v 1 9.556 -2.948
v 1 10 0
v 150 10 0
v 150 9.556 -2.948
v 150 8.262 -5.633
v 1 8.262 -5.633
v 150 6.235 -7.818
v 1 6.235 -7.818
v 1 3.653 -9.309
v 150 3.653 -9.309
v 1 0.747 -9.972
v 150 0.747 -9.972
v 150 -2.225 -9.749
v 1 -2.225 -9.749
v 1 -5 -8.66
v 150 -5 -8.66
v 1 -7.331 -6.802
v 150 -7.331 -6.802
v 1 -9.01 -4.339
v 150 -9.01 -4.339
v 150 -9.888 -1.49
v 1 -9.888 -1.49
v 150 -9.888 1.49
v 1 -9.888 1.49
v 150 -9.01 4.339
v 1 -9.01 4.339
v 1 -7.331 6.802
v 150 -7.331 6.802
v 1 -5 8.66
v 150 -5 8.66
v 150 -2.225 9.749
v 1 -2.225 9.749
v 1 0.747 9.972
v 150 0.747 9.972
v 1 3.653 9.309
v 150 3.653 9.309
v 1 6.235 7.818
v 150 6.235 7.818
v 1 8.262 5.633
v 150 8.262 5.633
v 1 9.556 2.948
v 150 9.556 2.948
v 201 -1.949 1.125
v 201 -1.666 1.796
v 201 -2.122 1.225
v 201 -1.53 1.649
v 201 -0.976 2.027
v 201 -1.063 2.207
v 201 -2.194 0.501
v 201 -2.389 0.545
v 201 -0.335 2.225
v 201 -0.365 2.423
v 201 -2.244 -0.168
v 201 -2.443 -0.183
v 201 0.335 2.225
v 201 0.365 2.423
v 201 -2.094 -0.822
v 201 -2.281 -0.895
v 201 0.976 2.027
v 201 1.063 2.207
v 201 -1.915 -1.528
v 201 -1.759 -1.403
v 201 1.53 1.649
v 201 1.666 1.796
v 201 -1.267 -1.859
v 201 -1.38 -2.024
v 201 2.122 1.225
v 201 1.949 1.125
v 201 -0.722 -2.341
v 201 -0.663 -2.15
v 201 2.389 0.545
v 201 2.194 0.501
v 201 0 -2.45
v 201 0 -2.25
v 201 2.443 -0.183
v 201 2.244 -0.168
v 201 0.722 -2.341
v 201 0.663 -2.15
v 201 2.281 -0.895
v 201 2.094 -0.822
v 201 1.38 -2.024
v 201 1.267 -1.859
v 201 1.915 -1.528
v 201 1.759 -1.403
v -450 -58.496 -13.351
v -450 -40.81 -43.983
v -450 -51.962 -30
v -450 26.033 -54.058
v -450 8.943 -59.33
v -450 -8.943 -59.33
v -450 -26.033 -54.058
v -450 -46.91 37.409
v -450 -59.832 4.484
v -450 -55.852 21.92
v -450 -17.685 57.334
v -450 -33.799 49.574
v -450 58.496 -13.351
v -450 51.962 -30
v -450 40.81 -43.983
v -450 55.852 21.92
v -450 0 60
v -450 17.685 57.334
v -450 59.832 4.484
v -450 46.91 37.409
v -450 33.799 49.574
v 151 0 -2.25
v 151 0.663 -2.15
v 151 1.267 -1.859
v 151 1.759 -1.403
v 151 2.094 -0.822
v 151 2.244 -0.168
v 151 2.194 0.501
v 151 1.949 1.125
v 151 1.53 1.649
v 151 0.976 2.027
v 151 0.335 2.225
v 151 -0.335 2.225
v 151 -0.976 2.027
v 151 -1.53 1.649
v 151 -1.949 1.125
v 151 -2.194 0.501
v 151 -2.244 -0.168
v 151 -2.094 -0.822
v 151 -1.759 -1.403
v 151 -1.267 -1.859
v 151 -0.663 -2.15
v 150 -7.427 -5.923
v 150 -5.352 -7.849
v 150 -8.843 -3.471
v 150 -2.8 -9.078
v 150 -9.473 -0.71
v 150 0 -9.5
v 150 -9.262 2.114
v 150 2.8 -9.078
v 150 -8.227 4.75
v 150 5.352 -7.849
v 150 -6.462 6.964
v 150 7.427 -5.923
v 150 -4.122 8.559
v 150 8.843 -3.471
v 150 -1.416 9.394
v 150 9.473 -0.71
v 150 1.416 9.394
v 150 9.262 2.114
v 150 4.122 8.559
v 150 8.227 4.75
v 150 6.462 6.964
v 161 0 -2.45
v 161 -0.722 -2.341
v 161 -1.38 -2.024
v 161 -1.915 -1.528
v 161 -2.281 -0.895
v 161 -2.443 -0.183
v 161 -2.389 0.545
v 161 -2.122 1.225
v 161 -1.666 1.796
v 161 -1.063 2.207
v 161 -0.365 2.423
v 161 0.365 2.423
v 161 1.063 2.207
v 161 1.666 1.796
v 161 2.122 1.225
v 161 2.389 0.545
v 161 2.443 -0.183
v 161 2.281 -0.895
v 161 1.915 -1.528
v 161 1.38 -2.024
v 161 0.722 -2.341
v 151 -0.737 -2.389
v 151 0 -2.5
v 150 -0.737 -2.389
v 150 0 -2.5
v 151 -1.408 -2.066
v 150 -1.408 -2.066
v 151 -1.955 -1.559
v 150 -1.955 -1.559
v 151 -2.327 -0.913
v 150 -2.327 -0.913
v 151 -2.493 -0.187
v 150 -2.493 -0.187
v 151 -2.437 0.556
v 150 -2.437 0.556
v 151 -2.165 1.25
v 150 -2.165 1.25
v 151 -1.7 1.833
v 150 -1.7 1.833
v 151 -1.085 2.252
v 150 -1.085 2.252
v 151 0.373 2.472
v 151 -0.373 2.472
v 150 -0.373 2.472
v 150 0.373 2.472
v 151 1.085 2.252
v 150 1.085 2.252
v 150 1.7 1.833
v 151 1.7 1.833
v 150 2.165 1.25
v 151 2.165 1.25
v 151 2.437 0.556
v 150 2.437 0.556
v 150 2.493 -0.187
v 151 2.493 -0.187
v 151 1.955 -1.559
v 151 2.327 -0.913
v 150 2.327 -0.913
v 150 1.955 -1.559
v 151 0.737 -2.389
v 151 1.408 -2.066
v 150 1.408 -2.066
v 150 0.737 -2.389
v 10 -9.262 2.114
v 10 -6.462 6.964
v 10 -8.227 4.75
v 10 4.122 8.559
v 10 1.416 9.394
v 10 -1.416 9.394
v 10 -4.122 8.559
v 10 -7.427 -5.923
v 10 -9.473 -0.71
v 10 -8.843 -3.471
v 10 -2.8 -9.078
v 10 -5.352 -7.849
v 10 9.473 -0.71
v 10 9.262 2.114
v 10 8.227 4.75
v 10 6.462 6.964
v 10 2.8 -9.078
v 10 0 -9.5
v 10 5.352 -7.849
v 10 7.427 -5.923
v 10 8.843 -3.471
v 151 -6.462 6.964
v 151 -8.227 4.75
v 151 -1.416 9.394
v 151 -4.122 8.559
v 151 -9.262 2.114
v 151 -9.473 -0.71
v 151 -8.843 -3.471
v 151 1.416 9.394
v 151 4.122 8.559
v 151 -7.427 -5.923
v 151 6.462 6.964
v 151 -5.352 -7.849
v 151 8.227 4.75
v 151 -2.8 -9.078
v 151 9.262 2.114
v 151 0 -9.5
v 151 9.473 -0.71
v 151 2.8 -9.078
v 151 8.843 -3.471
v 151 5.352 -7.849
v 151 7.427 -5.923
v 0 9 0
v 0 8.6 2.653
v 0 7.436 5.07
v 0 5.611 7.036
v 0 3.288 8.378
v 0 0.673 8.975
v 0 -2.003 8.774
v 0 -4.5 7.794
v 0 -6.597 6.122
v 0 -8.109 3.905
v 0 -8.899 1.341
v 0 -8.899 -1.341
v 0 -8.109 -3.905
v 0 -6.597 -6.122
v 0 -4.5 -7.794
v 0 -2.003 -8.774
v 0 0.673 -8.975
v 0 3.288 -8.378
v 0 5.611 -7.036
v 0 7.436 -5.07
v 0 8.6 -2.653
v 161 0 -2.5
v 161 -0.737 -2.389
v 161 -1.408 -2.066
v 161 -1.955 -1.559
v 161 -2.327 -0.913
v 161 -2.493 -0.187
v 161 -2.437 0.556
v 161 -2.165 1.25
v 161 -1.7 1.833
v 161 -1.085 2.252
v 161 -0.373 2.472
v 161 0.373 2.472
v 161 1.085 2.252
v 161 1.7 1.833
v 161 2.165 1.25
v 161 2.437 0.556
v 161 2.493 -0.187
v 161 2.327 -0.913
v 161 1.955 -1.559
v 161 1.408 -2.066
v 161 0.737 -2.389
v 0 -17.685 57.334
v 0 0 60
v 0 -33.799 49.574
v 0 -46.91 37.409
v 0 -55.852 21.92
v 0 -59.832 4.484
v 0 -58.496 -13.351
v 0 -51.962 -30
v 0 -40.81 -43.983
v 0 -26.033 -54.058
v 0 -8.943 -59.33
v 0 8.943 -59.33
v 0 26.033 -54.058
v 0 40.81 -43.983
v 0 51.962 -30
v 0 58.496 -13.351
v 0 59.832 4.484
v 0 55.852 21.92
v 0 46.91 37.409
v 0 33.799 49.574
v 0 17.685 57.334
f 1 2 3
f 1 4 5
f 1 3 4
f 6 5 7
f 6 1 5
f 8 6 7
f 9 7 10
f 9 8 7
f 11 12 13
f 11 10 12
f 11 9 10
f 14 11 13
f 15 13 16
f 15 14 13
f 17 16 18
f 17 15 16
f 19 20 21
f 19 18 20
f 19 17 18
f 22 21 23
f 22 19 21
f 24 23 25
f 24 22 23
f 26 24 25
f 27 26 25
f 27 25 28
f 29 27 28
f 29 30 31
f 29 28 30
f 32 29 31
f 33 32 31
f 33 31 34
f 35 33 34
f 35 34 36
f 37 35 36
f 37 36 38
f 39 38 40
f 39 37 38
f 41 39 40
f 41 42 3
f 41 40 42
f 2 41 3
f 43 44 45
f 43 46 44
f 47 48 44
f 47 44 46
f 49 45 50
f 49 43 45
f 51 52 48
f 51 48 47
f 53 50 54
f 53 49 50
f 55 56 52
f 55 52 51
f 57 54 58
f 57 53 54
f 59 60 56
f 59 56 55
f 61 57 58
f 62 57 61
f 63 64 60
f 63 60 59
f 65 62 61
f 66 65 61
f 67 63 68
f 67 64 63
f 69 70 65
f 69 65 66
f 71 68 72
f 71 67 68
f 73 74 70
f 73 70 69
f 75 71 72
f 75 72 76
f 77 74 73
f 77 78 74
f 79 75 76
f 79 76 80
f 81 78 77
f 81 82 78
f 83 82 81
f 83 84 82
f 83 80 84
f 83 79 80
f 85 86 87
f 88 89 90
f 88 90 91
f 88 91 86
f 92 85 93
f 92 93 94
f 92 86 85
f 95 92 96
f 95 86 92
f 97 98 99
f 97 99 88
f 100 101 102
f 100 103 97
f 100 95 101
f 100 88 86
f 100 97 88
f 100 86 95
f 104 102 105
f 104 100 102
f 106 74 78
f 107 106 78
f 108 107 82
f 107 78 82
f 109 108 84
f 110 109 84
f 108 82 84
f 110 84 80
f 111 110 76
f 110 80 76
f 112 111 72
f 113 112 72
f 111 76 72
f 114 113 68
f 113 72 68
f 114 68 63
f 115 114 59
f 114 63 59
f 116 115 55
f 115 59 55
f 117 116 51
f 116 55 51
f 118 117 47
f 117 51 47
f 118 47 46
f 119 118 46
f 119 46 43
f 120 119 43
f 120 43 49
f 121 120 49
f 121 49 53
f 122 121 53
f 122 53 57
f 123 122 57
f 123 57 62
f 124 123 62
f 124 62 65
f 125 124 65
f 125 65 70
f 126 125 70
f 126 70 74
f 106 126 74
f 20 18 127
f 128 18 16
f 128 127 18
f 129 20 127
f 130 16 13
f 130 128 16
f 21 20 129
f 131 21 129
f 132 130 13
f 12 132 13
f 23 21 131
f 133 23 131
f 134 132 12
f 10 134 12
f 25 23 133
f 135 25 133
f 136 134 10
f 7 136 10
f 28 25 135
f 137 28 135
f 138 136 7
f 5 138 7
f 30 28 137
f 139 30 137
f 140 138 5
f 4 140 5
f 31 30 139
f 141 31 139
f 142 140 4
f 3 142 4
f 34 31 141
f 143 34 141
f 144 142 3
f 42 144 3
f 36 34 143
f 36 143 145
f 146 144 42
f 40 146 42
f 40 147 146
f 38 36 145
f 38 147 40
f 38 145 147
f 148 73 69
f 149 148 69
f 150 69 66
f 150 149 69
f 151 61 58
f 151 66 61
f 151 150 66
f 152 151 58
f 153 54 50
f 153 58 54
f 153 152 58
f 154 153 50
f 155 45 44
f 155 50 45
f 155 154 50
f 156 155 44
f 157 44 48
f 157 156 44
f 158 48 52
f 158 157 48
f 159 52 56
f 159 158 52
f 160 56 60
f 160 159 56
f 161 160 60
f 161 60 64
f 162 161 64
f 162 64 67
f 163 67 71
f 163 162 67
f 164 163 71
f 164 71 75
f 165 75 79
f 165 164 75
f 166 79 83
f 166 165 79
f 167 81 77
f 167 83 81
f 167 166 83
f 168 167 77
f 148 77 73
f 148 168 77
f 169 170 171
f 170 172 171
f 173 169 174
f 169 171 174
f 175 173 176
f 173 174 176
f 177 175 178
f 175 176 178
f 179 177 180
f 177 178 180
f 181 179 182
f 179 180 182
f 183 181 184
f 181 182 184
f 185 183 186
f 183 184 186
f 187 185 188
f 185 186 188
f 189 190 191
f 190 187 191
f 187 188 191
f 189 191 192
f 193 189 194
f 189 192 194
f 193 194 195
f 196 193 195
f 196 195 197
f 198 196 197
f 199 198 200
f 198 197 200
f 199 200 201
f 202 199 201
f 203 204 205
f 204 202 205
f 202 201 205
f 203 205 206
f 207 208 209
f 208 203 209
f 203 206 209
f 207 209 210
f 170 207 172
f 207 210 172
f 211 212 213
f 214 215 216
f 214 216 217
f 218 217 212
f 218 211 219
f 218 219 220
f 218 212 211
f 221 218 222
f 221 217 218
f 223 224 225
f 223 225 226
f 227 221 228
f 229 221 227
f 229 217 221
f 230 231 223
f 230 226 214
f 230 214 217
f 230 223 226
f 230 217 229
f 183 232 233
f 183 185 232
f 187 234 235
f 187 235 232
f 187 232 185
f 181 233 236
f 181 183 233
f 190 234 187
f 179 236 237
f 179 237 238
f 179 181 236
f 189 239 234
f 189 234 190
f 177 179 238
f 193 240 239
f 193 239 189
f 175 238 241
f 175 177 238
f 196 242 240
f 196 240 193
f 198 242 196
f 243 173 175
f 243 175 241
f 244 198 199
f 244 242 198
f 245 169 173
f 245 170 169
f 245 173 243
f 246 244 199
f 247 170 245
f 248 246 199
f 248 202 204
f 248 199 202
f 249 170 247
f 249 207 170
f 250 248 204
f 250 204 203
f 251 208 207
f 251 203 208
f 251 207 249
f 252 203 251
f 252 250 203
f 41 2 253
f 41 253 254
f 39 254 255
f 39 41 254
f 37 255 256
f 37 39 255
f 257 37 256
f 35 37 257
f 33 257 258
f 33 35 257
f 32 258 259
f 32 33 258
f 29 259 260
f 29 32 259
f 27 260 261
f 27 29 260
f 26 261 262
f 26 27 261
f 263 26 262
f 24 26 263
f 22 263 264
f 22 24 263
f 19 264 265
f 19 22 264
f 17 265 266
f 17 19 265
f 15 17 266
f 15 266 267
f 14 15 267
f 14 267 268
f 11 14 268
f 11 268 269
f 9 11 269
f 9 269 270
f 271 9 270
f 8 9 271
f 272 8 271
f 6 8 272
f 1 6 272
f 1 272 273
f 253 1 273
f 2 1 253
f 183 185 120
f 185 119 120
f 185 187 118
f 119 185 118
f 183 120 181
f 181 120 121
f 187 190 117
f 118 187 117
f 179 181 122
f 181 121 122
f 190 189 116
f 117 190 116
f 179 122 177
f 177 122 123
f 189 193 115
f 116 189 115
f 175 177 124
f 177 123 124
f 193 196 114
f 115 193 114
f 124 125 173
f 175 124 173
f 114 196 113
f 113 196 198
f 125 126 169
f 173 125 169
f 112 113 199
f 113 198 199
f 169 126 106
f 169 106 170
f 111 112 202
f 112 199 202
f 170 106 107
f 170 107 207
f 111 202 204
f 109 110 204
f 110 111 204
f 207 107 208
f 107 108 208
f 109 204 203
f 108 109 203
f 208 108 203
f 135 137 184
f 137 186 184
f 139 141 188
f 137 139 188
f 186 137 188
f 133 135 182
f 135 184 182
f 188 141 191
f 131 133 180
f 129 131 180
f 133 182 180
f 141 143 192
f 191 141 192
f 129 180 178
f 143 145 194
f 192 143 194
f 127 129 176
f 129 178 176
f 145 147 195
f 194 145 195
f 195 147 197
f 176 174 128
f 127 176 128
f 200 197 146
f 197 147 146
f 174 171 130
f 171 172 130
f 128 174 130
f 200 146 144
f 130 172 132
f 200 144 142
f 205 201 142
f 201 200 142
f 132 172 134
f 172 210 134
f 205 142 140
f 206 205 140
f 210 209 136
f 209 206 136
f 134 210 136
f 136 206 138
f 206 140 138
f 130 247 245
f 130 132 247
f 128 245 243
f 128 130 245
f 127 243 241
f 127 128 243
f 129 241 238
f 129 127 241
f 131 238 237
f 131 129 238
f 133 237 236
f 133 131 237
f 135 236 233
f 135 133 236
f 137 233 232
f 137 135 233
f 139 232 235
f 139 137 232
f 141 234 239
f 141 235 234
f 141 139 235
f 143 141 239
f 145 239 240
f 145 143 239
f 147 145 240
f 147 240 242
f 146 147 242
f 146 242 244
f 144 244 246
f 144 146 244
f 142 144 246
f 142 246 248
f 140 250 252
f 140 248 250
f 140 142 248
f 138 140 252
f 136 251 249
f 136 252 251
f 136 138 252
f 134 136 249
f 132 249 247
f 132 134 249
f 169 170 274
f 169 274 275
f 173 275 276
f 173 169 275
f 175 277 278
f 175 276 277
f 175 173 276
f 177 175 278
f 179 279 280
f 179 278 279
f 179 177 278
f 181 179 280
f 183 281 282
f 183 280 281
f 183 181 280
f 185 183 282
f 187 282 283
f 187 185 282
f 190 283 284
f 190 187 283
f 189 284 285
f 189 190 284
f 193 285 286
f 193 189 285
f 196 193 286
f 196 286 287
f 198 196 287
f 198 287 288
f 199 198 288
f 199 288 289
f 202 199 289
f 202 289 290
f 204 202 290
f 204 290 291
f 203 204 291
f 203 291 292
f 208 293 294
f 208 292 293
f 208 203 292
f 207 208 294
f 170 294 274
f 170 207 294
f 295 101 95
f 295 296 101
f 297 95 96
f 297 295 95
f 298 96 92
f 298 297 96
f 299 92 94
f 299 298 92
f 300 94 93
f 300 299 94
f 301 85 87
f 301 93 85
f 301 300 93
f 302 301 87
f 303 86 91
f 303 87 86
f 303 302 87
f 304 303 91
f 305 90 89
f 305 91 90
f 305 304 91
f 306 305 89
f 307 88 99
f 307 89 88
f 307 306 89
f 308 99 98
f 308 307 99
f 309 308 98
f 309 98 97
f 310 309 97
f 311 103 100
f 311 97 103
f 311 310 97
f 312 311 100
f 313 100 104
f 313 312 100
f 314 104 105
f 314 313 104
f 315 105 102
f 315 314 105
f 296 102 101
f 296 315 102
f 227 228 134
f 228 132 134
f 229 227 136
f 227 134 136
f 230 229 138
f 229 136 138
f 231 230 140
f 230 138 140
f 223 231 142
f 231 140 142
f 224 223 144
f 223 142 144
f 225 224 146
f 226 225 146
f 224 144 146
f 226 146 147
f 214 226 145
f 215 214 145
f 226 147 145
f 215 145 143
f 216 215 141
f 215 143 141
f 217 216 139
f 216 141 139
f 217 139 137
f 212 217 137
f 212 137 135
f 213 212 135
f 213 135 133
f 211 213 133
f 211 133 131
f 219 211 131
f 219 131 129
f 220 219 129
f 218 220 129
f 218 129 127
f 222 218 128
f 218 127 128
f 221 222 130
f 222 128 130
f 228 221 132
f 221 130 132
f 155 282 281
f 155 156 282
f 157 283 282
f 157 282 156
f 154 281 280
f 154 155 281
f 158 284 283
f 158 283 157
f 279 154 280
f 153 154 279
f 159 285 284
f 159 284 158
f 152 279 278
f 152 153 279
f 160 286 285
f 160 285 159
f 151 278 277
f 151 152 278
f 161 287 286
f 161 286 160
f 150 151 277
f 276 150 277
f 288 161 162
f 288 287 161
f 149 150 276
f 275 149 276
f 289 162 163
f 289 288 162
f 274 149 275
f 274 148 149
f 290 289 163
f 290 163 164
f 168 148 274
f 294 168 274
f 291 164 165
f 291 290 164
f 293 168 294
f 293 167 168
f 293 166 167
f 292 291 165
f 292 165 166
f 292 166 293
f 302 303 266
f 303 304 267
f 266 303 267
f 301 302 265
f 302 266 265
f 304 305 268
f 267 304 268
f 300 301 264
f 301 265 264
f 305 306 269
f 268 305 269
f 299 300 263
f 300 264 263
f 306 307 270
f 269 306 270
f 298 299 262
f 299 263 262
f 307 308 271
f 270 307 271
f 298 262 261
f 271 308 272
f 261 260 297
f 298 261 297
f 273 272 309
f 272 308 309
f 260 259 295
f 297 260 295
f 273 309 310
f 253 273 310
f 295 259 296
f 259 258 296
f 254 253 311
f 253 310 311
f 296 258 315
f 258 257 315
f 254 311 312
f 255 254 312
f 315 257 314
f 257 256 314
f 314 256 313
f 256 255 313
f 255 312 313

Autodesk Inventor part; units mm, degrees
ref_plane "YZ Plane" through (0, 0, 0) normal (1, 0, 0) x (0, 1, 0)
ref_plane "XZ Plane" through (0, 0, 0) normal (0, 1, 0) x (-1, 0, 0)
ref_plane "XY Plane" through (0, 0, 0) normal (0, 0, 1) x (1, 0, 0)
sketch "Sketch1" plane through (0, 0, 0) normal (1, 0, 0) x (0, 1, 0)
  circle A0 centre (0, 0) radius 10
  dimension "d0" = 20
extrude "Extrusion1" add sketch "Sketch1" along normal blind 150
sketch "Sketch2" plane through (150, 0, 0) normal (1, 0, 0) x (0, 0, -1)
  circle A0 centre (0, 0) radius 9.5
  dimension "d4" = 19
extrude "Extrusion2" cut sketch "Sketch2" against normal blind 140
sketch "Sketch3" plane through (150, 0, 0) normal (1, 0, 0) x (0, 0, -1)
  circle A0 centre (0, 0) radius 9.5
  circle A1 centre (0, 0) radius 2.5
  dimension "d7" = 5
extrude "Extrusion3" add sketch "Sketch3" along normal blind 1
sketch "Sketch4" plane through (151, 0, 0) normal (1, 0, 0) x (0, 0, -1)
  circle A0 centre (0, 0) radius 2.5 projected
  circle A1 centre (0, 0) radius 2.5
  dimension "d10" = 5
extrude "Extrusion4" add sketch "Sketch4" along normal blind 10
sketch "Sketch5" plane through (151, 0, 0) normal (1, 0, 0) x (0, 0, -1)
  circle A0 centre (0, 0) radius 2.45
  dimension "d13" = 4.9
sketch "Sketch6" plane through (161, 0, 0) normal (1, 0, 0) x (0, 0, -1)
  circle A0 centre (0, 0) radius 2.45
  dimension "d14" = 4.9
extrude "Extrusion5" cut sketch "Sketch6" against normal blind 120
extrude "Extrusion6" add sketch "Sketch5" along normal blind 50
sketch "Sketch7" plane through (201, 0, 0) normal (1, 0, 0) x (0, 0, -1)
  circle A0 centre (0, 0) radius 2.5 projected
  circle A1 centre (0, 0) radius 2.4
  dimension "d19" = 4.8
sketch "Sketch8" plane through (201, 0, 0) normal (1, 0, 0) x (0, 0, -1)
  circle A0 centre (0, 0) radius 2.5 projected
  circle A1 centre (0, 0) radius 2.25
  dimension "d20" = 4.5
extrude "Extrusion7" cut sketch "Sketch8" against normal blind 140 contours A1
chamfer "Chamfer1" distance 1 angle 45 1 edges at (0, -10, 0) measured on face at (0, -1.182, 3.1167)
sketch "Sketch10" plane through (0, 0, 0) normal (-1, 0, 0) x (0, 0, 1)
  circle A0 centre (0, 0) radius 2.5 projected
  circle A1 centre (0, 0) radius 9.5 projected
  circle A2 centre (0, 0) radius 60
  dimension "d28" = 120
extrude "Extrusion8" add sketch "Sketch10" along normal blind 450 contours A0 | A1 | A2
properties part number "supply agent"
